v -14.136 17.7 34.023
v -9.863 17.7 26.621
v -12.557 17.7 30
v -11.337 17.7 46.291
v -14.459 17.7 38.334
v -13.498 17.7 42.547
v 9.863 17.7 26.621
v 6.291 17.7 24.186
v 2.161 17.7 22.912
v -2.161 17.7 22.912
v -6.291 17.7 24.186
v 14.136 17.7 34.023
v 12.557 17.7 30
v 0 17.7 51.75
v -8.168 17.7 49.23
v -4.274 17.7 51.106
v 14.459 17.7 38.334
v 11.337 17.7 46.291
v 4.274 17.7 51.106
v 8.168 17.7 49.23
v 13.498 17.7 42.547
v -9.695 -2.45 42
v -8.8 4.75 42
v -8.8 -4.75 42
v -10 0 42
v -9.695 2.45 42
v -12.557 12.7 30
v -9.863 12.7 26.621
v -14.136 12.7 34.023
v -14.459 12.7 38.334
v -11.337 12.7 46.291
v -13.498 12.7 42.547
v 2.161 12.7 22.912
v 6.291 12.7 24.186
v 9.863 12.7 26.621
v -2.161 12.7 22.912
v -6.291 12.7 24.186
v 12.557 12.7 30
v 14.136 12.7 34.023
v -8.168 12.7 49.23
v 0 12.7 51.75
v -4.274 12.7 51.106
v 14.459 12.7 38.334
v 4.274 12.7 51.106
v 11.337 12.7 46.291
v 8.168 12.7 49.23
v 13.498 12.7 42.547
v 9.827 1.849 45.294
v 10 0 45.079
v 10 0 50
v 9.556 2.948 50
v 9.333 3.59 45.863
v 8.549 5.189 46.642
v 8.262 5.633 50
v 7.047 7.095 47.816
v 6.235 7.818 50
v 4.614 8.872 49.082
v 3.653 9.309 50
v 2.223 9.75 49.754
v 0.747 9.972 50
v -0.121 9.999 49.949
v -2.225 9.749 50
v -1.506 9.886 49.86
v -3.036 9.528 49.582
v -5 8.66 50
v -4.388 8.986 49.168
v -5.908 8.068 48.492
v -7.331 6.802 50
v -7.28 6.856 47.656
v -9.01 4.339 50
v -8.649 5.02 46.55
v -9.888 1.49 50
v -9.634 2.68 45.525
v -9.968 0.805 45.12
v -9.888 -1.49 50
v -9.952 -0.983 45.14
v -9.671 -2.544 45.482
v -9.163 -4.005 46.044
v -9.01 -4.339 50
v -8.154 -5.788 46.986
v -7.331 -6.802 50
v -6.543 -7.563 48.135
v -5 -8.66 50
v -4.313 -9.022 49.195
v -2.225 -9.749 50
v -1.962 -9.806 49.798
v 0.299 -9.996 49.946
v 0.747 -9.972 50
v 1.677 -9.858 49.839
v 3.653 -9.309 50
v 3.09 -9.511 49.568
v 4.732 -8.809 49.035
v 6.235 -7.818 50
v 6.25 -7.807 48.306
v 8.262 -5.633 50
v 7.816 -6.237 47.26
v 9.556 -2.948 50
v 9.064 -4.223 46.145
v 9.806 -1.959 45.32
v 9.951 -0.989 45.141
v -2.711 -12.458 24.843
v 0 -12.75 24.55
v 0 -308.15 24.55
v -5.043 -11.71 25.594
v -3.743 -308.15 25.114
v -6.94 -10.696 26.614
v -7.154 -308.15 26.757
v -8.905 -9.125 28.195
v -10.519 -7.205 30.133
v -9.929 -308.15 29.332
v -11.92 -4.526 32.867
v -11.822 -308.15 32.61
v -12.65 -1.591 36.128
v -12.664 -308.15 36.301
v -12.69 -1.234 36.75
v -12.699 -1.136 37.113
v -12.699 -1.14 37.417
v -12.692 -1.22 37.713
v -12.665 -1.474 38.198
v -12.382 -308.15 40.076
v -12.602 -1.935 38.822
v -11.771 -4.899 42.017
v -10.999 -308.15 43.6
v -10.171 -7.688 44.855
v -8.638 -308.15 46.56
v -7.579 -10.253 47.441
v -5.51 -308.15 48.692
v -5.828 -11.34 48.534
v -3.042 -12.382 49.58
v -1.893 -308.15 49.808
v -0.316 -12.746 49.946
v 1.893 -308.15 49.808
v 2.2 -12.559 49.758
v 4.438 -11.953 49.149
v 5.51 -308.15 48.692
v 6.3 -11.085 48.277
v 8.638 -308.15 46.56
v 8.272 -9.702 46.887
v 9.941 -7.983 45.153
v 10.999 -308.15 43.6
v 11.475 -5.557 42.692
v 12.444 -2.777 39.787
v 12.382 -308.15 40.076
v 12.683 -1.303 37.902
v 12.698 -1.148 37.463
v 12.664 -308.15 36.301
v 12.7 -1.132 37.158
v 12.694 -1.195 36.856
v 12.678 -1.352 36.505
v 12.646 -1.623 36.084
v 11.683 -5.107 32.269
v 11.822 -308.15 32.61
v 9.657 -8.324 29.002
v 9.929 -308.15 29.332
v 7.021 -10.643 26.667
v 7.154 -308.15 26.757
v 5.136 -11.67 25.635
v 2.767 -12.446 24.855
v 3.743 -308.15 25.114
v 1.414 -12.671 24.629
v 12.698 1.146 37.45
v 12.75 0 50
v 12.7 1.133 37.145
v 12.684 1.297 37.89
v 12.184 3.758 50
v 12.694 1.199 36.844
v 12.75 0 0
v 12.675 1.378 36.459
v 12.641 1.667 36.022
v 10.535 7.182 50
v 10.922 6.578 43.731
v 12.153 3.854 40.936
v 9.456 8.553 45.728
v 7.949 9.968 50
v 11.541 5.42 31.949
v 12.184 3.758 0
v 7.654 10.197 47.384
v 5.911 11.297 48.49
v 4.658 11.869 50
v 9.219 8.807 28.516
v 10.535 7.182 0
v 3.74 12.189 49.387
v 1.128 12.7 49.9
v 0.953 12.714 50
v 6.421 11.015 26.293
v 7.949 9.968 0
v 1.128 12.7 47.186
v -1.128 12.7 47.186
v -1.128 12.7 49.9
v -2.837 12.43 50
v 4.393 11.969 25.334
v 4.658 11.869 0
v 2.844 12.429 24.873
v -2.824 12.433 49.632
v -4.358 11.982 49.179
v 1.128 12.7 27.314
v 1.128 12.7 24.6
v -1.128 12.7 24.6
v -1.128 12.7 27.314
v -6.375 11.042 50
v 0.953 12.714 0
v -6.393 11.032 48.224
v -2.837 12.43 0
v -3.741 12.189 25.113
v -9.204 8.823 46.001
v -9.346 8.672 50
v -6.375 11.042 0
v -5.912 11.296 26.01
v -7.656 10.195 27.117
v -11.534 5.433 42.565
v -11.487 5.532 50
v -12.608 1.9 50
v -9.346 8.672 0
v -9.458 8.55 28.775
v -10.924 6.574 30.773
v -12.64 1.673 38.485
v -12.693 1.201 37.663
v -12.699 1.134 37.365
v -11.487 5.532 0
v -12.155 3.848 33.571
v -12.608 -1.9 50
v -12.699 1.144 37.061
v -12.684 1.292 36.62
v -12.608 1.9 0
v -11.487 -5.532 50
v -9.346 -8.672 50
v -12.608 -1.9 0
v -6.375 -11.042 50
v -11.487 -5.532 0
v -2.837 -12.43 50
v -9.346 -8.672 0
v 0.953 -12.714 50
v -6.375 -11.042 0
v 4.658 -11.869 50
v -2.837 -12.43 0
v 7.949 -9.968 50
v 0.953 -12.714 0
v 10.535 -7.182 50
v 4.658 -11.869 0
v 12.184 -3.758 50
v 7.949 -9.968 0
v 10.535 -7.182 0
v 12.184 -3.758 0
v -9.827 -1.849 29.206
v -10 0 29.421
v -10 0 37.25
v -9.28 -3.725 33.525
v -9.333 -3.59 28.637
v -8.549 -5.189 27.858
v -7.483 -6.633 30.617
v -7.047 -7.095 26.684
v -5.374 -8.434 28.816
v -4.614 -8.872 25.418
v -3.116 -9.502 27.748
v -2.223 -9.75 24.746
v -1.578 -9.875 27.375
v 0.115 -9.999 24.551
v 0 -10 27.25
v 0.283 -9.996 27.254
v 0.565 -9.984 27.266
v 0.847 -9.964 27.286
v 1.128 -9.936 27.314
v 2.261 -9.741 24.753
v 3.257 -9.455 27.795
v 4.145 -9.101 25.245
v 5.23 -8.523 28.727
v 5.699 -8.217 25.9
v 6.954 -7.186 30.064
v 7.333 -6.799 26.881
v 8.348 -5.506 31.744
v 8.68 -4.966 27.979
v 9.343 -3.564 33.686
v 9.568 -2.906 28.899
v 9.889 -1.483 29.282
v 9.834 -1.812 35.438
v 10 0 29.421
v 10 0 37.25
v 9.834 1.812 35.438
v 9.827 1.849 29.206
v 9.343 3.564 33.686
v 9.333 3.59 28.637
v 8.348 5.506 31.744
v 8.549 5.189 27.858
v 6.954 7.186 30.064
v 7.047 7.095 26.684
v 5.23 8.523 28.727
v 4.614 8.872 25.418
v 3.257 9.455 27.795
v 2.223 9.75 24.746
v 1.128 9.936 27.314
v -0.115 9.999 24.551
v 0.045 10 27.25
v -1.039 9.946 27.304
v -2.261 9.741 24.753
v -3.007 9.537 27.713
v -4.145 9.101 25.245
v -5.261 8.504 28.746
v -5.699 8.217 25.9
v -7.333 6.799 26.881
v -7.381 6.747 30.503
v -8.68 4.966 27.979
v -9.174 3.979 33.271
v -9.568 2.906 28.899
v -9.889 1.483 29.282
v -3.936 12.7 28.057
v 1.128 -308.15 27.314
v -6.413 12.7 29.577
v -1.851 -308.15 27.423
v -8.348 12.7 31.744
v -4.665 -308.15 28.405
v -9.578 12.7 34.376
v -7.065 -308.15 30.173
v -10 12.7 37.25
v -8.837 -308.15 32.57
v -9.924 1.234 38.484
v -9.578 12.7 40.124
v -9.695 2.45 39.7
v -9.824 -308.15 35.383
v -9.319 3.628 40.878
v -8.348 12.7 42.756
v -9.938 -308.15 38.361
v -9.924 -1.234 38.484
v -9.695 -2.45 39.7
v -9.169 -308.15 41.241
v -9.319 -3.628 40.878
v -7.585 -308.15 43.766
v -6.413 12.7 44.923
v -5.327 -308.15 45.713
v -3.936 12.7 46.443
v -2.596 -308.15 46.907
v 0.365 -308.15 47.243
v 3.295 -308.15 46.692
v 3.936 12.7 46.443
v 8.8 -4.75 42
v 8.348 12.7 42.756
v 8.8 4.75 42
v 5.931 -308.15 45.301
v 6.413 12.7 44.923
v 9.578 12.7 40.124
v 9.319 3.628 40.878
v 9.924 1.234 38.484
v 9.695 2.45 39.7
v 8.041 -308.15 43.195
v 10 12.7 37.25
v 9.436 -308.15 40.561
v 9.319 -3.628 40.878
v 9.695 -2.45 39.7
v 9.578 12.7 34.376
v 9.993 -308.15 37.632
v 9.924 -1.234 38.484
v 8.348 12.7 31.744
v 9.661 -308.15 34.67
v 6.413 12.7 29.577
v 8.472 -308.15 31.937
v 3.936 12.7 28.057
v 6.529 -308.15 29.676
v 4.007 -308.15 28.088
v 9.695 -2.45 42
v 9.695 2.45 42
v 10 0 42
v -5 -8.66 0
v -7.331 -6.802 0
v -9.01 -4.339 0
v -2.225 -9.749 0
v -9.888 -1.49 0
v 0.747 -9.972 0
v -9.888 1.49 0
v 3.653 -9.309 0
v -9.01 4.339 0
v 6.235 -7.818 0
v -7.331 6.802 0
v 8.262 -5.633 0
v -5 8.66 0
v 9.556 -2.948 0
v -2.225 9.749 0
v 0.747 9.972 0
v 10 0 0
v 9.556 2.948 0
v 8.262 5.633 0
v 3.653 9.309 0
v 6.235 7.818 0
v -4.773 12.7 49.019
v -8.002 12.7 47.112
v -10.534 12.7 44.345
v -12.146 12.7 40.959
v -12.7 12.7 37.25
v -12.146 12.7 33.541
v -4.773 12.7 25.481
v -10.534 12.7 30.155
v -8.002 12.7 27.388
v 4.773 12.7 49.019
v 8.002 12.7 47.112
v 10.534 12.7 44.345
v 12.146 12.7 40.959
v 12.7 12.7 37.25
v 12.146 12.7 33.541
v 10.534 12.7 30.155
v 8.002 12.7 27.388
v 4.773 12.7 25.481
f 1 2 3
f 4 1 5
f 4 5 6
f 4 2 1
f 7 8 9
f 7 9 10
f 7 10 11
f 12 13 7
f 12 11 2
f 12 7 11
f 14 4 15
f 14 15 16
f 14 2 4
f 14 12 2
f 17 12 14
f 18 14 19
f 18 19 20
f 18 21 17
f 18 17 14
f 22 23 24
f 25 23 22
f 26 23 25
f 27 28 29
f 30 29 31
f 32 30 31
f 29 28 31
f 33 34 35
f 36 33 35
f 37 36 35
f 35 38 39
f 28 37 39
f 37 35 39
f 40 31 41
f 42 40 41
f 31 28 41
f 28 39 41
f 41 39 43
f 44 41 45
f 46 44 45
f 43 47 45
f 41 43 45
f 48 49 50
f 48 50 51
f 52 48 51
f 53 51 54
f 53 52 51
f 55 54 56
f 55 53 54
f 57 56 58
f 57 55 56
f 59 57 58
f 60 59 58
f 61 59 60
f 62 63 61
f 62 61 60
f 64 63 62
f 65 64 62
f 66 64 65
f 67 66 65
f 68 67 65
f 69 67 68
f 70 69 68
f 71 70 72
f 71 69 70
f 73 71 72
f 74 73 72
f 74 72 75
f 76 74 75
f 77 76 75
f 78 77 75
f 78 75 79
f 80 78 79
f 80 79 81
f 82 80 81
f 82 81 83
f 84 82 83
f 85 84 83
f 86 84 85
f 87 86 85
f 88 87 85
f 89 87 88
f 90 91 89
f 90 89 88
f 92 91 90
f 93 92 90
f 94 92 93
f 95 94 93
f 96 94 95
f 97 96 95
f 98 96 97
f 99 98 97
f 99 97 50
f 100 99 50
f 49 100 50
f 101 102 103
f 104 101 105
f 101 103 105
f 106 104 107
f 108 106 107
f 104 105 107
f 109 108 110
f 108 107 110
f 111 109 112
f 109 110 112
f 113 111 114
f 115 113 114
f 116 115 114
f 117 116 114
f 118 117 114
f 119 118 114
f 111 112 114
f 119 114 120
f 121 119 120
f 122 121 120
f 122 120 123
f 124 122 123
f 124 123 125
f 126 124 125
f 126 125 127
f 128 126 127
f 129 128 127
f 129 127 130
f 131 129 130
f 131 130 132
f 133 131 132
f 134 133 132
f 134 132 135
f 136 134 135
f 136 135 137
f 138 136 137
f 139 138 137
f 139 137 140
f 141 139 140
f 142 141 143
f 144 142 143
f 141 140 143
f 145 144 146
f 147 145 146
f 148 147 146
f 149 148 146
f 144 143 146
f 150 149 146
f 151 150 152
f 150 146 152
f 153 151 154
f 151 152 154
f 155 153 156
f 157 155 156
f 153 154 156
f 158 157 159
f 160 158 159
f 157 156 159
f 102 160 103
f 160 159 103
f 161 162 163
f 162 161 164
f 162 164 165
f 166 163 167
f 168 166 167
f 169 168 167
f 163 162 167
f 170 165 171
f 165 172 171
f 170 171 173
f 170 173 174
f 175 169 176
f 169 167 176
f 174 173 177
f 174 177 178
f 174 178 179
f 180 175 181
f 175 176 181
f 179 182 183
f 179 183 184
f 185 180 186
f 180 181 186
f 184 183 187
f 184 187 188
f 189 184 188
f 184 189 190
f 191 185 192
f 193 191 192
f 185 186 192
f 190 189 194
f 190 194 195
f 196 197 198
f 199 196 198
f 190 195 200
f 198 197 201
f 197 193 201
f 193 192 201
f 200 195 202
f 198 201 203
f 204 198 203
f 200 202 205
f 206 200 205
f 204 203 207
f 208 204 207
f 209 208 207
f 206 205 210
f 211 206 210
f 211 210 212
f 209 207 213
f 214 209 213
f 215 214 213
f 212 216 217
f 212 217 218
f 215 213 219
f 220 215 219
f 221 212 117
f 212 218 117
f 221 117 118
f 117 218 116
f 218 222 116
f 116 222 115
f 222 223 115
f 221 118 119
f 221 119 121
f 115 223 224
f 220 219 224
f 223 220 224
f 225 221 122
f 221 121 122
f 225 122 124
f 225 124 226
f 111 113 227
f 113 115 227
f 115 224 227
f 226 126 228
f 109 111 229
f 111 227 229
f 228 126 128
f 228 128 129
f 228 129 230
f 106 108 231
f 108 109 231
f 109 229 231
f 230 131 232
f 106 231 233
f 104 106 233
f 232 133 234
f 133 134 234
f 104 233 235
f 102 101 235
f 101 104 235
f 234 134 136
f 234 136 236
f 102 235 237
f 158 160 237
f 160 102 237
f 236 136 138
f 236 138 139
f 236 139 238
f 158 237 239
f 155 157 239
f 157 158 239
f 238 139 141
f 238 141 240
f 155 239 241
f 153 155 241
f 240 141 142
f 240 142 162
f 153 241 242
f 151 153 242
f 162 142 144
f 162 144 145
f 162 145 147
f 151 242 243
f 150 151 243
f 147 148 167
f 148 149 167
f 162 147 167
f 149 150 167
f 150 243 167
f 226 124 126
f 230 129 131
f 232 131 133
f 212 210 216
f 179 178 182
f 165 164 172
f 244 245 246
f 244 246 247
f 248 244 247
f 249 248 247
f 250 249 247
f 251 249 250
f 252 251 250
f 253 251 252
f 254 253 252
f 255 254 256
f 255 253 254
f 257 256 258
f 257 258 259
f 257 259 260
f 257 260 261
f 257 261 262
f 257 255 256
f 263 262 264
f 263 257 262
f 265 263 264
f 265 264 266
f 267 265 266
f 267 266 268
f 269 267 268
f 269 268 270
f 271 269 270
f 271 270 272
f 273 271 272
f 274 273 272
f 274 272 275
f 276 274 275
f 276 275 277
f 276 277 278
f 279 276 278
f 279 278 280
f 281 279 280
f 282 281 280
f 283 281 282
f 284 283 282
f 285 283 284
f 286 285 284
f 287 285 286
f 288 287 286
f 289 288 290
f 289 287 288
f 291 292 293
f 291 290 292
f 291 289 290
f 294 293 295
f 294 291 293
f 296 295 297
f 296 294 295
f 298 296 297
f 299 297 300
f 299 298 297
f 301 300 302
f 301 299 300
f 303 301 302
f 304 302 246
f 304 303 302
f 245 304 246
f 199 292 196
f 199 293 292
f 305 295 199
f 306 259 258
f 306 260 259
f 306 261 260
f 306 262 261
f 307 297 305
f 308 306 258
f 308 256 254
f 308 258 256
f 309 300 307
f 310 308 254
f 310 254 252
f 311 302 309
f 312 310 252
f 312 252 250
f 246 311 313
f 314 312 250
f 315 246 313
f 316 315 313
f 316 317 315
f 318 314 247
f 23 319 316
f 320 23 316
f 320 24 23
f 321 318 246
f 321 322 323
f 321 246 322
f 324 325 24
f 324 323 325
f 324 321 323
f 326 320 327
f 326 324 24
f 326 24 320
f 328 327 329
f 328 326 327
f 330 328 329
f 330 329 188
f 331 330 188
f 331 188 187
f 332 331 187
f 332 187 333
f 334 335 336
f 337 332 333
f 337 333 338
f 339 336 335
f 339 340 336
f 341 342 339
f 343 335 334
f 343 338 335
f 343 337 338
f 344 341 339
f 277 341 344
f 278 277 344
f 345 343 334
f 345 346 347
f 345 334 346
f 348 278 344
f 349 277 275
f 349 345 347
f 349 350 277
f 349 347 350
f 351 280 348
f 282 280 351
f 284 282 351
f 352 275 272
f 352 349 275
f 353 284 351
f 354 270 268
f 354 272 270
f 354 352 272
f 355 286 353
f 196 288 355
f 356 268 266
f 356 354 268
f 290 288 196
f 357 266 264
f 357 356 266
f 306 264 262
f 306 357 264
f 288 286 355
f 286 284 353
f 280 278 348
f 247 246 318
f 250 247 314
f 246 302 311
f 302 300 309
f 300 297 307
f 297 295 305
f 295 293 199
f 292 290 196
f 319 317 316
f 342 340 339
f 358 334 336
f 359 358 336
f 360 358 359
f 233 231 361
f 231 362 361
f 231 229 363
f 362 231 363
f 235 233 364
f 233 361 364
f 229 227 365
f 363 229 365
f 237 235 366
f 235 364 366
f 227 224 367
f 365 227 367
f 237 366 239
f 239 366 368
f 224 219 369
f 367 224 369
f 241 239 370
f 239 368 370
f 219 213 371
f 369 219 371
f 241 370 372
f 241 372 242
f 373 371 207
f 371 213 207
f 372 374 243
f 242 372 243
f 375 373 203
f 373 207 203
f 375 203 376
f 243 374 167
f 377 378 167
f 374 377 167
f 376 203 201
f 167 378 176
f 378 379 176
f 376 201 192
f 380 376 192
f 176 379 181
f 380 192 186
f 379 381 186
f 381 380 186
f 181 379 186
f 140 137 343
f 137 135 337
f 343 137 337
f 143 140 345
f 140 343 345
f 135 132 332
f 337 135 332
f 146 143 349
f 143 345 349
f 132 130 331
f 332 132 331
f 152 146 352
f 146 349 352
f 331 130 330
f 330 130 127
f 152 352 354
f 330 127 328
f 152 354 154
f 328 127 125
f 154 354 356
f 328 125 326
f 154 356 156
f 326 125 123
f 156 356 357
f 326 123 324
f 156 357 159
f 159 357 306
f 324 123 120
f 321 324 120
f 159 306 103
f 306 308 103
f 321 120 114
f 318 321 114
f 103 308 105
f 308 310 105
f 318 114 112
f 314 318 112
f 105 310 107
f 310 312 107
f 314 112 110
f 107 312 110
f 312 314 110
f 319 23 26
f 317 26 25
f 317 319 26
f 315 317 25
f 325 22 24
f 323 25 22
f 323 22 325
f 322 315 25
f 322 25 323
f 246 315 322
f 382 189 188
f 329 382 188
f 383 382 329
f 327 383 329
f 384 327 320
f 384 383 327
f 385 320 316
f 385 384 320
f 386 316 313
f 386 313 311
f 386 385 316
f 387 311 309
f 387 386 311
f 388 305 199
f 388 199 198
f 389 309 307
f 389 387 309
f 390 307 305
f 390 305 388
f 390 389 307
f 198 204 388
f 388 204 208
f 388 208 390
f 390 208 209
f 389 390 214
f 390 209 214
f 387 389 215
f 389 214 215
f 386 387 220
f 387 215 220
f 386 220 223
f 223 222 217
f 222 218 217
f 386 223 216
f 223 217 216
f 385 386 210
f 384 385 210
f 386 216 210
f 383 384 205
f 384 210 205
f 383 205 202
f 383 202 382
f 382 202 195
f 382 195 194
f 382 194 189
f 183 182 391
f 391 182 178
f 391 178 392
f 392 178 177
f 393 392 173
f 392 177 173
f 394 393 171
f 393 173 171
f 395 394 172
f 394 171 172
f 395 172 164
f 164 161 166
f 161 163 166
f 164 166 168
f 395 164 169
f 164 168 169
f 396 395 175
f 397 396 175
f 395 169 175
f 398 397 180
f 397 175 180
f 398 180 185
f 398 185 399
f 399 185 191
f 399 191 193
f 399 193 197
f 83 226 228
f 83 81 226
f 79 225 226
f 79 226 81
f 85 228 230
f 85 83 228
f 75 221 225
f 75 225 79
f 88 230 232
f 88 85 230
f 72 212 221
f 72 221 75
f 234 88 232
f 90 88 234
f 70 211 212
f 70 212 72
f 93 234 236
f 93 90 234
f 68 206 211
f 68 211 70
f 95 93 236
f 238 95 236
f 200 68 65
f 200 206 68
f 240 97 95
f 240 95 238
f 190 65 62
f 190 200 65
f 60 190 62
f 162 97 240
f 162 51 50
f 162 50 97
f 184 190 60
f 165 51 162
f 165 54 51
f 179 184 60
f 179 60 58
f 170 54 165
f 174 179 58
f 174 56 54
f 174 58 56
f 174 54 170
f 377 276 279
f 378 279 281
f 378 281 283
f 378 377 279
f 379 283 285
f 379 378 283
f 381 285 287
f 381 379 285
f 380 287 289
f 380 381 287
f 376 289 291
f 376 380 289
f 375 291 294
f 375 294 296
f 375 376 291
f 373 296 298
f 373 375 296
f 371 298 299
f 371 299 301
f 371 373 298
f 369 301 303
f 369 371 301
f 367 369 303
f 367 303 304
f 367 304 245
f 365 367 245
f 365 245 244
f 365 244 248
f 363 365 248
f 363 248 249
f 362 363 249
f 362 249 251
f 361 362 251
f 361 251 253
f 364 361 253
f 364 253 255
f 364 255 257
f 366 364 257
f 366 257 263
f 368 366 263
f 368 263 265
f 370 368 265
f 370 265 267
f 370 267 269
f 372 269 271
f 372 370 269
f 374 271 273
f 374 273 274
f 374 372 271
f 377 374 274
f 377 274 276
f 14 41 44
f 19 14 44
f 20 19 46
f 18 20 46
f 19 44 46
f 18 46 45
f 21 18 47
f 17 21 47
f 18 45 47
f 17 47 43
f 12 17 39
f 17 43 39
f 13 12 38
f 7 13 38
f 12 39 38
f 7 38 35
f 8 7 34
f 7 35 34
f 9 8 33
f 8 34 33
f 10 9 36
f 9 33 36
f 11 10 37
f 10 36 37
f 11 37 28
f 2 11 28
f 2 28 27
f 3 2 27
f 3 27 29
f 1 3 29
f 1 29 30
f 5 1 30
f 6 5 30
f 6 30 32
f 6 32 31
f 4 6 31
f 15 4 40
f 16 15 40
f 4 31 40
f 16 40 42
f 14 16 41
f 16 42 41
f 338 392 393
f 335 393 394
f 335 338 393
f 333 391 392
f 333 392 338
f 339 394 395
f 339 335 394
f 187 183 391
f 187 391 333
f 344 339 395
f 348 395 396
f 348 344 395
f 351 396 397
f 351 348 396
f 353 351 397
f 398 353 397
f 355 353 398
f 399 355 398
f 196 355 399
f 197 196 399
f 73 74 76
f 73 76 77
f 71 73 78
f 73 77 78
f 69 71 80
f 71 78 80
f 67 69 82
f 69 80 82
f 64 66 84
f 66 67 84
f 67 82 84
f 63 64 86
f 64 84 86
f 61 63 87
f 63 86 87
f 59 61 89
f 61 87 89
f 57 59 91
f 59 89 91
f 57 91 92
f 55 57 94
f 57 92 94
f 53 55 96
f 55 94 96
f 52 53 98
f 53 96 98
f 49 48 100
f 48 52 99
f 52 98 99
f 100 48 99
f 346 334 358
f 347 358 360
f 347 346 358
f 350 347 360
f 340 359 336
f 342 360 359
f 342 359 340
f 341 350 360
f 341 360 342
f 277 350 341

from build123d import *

# Parameters (mm, degrees)
CROQUIS1_R                   = 12.75
CROQUIS1_R_2                 = 10
SALIENTE_EXTRUIR1_DEPTH      = 50
SALIENTE_EXTRUIR2_DEPTH      = 25.4
SALIENTE_EXTRUIR2_DEPTH_BACK = 295.45
CROQUIS2_R                   = 12.7
CORTAR_EXTRUIR1_DEPTH        = 300.922098338
CORTAR_EXTRUIR1_DEPTH_BACK   = 300.922098338
CROQUIS3_R                   = 10
CROQUIS4_R                   = 10
CORTAR_EXTRUIR2_DEPTH        = 42
CROQUIS5_R                   = 14.5
SALIENTE_EXTRUIR4_DEPTH      = 5


with BuildPart() as part:
    # Croquis1 → Saliente-Extruir1 (new body)
    with BuildSketch(Plane.XY):
        Circle(CROQUIS1_R)
        Circle(CROQUIS1_R_2, mode=Mode.SUBTRACT)
    extrude(amount=SALIENTE_EXTRUIR1_DEPTH)

    # Croquis2 → Saliente-Extruir2 (add, two sides: drawn at the far end of the back side and taken through both)
    with BuildSketch(Plane(origin=(0, -12.7, 0), x_dir=(1, 0, 0), z_dir=(0, 1, 0)).offset(-SALIENTE_EXTRUIR2_DEPTH_BACK)):
        with Locations(Location((0, -37.25, 0), (0, 0, 90))):
            Circle(CROQUIS2_R)
    extrude(amount=SALIENTE_EXTRUIR2_DEPTH + SALIENTE_EXTRUIR2_DEPTH_BACK)

    # Croquis3 → Cortar-Extruir1 (cut, two sides: drawn at the far end of the back side and taken through both)
    with BuildSketch(Plane(origin=(0, -12.7, 0), x_dir=(1, 0, 0), z_dir=(0, 1, 0)).offset(-CORTAR_EXTRUIR1_DEPTH_BACK)):
        with Locations(Location((0, -37.25, 0), (0, 0, 83.522954936))):
            Circle(CROQUIS3_R)
    extrude(amount=CORTAR_EXTRUIR1_DEPTH + CORTAR_EXTRUIR1_DEPTH_BACK, mode=Mode.SUBTRACT)

    # Croquis4 → Cortar-Extruir2 (cut)
    with BuildSketch(Plane.XY):
        with Locations(Location((0, 0, 0), (0, 0, 180))):
            Circle(CROQUIS4_R)
    extrude(amount=CORTAR_EXTRUIR2_DEPTH, mode=Mode.SUBTRACT)


with BuildPart() as body_2:
    # Croquis5 → Saliente-Extruir4 (new body)
    with BuildSketch(Plane(origin=(0, 12.7, 0), x_dir=(1, 0, 0), z_dir=(0, 1, 0))):
        with Locations(Location((0, -37.25, 0), (0, 0, 270))):
            Circle(CROQUIS5_R)
    extrude(amount=SALIENTE_EXTRUIR4_DEPTH)


solid = Compound([part.part, body_2.part])
